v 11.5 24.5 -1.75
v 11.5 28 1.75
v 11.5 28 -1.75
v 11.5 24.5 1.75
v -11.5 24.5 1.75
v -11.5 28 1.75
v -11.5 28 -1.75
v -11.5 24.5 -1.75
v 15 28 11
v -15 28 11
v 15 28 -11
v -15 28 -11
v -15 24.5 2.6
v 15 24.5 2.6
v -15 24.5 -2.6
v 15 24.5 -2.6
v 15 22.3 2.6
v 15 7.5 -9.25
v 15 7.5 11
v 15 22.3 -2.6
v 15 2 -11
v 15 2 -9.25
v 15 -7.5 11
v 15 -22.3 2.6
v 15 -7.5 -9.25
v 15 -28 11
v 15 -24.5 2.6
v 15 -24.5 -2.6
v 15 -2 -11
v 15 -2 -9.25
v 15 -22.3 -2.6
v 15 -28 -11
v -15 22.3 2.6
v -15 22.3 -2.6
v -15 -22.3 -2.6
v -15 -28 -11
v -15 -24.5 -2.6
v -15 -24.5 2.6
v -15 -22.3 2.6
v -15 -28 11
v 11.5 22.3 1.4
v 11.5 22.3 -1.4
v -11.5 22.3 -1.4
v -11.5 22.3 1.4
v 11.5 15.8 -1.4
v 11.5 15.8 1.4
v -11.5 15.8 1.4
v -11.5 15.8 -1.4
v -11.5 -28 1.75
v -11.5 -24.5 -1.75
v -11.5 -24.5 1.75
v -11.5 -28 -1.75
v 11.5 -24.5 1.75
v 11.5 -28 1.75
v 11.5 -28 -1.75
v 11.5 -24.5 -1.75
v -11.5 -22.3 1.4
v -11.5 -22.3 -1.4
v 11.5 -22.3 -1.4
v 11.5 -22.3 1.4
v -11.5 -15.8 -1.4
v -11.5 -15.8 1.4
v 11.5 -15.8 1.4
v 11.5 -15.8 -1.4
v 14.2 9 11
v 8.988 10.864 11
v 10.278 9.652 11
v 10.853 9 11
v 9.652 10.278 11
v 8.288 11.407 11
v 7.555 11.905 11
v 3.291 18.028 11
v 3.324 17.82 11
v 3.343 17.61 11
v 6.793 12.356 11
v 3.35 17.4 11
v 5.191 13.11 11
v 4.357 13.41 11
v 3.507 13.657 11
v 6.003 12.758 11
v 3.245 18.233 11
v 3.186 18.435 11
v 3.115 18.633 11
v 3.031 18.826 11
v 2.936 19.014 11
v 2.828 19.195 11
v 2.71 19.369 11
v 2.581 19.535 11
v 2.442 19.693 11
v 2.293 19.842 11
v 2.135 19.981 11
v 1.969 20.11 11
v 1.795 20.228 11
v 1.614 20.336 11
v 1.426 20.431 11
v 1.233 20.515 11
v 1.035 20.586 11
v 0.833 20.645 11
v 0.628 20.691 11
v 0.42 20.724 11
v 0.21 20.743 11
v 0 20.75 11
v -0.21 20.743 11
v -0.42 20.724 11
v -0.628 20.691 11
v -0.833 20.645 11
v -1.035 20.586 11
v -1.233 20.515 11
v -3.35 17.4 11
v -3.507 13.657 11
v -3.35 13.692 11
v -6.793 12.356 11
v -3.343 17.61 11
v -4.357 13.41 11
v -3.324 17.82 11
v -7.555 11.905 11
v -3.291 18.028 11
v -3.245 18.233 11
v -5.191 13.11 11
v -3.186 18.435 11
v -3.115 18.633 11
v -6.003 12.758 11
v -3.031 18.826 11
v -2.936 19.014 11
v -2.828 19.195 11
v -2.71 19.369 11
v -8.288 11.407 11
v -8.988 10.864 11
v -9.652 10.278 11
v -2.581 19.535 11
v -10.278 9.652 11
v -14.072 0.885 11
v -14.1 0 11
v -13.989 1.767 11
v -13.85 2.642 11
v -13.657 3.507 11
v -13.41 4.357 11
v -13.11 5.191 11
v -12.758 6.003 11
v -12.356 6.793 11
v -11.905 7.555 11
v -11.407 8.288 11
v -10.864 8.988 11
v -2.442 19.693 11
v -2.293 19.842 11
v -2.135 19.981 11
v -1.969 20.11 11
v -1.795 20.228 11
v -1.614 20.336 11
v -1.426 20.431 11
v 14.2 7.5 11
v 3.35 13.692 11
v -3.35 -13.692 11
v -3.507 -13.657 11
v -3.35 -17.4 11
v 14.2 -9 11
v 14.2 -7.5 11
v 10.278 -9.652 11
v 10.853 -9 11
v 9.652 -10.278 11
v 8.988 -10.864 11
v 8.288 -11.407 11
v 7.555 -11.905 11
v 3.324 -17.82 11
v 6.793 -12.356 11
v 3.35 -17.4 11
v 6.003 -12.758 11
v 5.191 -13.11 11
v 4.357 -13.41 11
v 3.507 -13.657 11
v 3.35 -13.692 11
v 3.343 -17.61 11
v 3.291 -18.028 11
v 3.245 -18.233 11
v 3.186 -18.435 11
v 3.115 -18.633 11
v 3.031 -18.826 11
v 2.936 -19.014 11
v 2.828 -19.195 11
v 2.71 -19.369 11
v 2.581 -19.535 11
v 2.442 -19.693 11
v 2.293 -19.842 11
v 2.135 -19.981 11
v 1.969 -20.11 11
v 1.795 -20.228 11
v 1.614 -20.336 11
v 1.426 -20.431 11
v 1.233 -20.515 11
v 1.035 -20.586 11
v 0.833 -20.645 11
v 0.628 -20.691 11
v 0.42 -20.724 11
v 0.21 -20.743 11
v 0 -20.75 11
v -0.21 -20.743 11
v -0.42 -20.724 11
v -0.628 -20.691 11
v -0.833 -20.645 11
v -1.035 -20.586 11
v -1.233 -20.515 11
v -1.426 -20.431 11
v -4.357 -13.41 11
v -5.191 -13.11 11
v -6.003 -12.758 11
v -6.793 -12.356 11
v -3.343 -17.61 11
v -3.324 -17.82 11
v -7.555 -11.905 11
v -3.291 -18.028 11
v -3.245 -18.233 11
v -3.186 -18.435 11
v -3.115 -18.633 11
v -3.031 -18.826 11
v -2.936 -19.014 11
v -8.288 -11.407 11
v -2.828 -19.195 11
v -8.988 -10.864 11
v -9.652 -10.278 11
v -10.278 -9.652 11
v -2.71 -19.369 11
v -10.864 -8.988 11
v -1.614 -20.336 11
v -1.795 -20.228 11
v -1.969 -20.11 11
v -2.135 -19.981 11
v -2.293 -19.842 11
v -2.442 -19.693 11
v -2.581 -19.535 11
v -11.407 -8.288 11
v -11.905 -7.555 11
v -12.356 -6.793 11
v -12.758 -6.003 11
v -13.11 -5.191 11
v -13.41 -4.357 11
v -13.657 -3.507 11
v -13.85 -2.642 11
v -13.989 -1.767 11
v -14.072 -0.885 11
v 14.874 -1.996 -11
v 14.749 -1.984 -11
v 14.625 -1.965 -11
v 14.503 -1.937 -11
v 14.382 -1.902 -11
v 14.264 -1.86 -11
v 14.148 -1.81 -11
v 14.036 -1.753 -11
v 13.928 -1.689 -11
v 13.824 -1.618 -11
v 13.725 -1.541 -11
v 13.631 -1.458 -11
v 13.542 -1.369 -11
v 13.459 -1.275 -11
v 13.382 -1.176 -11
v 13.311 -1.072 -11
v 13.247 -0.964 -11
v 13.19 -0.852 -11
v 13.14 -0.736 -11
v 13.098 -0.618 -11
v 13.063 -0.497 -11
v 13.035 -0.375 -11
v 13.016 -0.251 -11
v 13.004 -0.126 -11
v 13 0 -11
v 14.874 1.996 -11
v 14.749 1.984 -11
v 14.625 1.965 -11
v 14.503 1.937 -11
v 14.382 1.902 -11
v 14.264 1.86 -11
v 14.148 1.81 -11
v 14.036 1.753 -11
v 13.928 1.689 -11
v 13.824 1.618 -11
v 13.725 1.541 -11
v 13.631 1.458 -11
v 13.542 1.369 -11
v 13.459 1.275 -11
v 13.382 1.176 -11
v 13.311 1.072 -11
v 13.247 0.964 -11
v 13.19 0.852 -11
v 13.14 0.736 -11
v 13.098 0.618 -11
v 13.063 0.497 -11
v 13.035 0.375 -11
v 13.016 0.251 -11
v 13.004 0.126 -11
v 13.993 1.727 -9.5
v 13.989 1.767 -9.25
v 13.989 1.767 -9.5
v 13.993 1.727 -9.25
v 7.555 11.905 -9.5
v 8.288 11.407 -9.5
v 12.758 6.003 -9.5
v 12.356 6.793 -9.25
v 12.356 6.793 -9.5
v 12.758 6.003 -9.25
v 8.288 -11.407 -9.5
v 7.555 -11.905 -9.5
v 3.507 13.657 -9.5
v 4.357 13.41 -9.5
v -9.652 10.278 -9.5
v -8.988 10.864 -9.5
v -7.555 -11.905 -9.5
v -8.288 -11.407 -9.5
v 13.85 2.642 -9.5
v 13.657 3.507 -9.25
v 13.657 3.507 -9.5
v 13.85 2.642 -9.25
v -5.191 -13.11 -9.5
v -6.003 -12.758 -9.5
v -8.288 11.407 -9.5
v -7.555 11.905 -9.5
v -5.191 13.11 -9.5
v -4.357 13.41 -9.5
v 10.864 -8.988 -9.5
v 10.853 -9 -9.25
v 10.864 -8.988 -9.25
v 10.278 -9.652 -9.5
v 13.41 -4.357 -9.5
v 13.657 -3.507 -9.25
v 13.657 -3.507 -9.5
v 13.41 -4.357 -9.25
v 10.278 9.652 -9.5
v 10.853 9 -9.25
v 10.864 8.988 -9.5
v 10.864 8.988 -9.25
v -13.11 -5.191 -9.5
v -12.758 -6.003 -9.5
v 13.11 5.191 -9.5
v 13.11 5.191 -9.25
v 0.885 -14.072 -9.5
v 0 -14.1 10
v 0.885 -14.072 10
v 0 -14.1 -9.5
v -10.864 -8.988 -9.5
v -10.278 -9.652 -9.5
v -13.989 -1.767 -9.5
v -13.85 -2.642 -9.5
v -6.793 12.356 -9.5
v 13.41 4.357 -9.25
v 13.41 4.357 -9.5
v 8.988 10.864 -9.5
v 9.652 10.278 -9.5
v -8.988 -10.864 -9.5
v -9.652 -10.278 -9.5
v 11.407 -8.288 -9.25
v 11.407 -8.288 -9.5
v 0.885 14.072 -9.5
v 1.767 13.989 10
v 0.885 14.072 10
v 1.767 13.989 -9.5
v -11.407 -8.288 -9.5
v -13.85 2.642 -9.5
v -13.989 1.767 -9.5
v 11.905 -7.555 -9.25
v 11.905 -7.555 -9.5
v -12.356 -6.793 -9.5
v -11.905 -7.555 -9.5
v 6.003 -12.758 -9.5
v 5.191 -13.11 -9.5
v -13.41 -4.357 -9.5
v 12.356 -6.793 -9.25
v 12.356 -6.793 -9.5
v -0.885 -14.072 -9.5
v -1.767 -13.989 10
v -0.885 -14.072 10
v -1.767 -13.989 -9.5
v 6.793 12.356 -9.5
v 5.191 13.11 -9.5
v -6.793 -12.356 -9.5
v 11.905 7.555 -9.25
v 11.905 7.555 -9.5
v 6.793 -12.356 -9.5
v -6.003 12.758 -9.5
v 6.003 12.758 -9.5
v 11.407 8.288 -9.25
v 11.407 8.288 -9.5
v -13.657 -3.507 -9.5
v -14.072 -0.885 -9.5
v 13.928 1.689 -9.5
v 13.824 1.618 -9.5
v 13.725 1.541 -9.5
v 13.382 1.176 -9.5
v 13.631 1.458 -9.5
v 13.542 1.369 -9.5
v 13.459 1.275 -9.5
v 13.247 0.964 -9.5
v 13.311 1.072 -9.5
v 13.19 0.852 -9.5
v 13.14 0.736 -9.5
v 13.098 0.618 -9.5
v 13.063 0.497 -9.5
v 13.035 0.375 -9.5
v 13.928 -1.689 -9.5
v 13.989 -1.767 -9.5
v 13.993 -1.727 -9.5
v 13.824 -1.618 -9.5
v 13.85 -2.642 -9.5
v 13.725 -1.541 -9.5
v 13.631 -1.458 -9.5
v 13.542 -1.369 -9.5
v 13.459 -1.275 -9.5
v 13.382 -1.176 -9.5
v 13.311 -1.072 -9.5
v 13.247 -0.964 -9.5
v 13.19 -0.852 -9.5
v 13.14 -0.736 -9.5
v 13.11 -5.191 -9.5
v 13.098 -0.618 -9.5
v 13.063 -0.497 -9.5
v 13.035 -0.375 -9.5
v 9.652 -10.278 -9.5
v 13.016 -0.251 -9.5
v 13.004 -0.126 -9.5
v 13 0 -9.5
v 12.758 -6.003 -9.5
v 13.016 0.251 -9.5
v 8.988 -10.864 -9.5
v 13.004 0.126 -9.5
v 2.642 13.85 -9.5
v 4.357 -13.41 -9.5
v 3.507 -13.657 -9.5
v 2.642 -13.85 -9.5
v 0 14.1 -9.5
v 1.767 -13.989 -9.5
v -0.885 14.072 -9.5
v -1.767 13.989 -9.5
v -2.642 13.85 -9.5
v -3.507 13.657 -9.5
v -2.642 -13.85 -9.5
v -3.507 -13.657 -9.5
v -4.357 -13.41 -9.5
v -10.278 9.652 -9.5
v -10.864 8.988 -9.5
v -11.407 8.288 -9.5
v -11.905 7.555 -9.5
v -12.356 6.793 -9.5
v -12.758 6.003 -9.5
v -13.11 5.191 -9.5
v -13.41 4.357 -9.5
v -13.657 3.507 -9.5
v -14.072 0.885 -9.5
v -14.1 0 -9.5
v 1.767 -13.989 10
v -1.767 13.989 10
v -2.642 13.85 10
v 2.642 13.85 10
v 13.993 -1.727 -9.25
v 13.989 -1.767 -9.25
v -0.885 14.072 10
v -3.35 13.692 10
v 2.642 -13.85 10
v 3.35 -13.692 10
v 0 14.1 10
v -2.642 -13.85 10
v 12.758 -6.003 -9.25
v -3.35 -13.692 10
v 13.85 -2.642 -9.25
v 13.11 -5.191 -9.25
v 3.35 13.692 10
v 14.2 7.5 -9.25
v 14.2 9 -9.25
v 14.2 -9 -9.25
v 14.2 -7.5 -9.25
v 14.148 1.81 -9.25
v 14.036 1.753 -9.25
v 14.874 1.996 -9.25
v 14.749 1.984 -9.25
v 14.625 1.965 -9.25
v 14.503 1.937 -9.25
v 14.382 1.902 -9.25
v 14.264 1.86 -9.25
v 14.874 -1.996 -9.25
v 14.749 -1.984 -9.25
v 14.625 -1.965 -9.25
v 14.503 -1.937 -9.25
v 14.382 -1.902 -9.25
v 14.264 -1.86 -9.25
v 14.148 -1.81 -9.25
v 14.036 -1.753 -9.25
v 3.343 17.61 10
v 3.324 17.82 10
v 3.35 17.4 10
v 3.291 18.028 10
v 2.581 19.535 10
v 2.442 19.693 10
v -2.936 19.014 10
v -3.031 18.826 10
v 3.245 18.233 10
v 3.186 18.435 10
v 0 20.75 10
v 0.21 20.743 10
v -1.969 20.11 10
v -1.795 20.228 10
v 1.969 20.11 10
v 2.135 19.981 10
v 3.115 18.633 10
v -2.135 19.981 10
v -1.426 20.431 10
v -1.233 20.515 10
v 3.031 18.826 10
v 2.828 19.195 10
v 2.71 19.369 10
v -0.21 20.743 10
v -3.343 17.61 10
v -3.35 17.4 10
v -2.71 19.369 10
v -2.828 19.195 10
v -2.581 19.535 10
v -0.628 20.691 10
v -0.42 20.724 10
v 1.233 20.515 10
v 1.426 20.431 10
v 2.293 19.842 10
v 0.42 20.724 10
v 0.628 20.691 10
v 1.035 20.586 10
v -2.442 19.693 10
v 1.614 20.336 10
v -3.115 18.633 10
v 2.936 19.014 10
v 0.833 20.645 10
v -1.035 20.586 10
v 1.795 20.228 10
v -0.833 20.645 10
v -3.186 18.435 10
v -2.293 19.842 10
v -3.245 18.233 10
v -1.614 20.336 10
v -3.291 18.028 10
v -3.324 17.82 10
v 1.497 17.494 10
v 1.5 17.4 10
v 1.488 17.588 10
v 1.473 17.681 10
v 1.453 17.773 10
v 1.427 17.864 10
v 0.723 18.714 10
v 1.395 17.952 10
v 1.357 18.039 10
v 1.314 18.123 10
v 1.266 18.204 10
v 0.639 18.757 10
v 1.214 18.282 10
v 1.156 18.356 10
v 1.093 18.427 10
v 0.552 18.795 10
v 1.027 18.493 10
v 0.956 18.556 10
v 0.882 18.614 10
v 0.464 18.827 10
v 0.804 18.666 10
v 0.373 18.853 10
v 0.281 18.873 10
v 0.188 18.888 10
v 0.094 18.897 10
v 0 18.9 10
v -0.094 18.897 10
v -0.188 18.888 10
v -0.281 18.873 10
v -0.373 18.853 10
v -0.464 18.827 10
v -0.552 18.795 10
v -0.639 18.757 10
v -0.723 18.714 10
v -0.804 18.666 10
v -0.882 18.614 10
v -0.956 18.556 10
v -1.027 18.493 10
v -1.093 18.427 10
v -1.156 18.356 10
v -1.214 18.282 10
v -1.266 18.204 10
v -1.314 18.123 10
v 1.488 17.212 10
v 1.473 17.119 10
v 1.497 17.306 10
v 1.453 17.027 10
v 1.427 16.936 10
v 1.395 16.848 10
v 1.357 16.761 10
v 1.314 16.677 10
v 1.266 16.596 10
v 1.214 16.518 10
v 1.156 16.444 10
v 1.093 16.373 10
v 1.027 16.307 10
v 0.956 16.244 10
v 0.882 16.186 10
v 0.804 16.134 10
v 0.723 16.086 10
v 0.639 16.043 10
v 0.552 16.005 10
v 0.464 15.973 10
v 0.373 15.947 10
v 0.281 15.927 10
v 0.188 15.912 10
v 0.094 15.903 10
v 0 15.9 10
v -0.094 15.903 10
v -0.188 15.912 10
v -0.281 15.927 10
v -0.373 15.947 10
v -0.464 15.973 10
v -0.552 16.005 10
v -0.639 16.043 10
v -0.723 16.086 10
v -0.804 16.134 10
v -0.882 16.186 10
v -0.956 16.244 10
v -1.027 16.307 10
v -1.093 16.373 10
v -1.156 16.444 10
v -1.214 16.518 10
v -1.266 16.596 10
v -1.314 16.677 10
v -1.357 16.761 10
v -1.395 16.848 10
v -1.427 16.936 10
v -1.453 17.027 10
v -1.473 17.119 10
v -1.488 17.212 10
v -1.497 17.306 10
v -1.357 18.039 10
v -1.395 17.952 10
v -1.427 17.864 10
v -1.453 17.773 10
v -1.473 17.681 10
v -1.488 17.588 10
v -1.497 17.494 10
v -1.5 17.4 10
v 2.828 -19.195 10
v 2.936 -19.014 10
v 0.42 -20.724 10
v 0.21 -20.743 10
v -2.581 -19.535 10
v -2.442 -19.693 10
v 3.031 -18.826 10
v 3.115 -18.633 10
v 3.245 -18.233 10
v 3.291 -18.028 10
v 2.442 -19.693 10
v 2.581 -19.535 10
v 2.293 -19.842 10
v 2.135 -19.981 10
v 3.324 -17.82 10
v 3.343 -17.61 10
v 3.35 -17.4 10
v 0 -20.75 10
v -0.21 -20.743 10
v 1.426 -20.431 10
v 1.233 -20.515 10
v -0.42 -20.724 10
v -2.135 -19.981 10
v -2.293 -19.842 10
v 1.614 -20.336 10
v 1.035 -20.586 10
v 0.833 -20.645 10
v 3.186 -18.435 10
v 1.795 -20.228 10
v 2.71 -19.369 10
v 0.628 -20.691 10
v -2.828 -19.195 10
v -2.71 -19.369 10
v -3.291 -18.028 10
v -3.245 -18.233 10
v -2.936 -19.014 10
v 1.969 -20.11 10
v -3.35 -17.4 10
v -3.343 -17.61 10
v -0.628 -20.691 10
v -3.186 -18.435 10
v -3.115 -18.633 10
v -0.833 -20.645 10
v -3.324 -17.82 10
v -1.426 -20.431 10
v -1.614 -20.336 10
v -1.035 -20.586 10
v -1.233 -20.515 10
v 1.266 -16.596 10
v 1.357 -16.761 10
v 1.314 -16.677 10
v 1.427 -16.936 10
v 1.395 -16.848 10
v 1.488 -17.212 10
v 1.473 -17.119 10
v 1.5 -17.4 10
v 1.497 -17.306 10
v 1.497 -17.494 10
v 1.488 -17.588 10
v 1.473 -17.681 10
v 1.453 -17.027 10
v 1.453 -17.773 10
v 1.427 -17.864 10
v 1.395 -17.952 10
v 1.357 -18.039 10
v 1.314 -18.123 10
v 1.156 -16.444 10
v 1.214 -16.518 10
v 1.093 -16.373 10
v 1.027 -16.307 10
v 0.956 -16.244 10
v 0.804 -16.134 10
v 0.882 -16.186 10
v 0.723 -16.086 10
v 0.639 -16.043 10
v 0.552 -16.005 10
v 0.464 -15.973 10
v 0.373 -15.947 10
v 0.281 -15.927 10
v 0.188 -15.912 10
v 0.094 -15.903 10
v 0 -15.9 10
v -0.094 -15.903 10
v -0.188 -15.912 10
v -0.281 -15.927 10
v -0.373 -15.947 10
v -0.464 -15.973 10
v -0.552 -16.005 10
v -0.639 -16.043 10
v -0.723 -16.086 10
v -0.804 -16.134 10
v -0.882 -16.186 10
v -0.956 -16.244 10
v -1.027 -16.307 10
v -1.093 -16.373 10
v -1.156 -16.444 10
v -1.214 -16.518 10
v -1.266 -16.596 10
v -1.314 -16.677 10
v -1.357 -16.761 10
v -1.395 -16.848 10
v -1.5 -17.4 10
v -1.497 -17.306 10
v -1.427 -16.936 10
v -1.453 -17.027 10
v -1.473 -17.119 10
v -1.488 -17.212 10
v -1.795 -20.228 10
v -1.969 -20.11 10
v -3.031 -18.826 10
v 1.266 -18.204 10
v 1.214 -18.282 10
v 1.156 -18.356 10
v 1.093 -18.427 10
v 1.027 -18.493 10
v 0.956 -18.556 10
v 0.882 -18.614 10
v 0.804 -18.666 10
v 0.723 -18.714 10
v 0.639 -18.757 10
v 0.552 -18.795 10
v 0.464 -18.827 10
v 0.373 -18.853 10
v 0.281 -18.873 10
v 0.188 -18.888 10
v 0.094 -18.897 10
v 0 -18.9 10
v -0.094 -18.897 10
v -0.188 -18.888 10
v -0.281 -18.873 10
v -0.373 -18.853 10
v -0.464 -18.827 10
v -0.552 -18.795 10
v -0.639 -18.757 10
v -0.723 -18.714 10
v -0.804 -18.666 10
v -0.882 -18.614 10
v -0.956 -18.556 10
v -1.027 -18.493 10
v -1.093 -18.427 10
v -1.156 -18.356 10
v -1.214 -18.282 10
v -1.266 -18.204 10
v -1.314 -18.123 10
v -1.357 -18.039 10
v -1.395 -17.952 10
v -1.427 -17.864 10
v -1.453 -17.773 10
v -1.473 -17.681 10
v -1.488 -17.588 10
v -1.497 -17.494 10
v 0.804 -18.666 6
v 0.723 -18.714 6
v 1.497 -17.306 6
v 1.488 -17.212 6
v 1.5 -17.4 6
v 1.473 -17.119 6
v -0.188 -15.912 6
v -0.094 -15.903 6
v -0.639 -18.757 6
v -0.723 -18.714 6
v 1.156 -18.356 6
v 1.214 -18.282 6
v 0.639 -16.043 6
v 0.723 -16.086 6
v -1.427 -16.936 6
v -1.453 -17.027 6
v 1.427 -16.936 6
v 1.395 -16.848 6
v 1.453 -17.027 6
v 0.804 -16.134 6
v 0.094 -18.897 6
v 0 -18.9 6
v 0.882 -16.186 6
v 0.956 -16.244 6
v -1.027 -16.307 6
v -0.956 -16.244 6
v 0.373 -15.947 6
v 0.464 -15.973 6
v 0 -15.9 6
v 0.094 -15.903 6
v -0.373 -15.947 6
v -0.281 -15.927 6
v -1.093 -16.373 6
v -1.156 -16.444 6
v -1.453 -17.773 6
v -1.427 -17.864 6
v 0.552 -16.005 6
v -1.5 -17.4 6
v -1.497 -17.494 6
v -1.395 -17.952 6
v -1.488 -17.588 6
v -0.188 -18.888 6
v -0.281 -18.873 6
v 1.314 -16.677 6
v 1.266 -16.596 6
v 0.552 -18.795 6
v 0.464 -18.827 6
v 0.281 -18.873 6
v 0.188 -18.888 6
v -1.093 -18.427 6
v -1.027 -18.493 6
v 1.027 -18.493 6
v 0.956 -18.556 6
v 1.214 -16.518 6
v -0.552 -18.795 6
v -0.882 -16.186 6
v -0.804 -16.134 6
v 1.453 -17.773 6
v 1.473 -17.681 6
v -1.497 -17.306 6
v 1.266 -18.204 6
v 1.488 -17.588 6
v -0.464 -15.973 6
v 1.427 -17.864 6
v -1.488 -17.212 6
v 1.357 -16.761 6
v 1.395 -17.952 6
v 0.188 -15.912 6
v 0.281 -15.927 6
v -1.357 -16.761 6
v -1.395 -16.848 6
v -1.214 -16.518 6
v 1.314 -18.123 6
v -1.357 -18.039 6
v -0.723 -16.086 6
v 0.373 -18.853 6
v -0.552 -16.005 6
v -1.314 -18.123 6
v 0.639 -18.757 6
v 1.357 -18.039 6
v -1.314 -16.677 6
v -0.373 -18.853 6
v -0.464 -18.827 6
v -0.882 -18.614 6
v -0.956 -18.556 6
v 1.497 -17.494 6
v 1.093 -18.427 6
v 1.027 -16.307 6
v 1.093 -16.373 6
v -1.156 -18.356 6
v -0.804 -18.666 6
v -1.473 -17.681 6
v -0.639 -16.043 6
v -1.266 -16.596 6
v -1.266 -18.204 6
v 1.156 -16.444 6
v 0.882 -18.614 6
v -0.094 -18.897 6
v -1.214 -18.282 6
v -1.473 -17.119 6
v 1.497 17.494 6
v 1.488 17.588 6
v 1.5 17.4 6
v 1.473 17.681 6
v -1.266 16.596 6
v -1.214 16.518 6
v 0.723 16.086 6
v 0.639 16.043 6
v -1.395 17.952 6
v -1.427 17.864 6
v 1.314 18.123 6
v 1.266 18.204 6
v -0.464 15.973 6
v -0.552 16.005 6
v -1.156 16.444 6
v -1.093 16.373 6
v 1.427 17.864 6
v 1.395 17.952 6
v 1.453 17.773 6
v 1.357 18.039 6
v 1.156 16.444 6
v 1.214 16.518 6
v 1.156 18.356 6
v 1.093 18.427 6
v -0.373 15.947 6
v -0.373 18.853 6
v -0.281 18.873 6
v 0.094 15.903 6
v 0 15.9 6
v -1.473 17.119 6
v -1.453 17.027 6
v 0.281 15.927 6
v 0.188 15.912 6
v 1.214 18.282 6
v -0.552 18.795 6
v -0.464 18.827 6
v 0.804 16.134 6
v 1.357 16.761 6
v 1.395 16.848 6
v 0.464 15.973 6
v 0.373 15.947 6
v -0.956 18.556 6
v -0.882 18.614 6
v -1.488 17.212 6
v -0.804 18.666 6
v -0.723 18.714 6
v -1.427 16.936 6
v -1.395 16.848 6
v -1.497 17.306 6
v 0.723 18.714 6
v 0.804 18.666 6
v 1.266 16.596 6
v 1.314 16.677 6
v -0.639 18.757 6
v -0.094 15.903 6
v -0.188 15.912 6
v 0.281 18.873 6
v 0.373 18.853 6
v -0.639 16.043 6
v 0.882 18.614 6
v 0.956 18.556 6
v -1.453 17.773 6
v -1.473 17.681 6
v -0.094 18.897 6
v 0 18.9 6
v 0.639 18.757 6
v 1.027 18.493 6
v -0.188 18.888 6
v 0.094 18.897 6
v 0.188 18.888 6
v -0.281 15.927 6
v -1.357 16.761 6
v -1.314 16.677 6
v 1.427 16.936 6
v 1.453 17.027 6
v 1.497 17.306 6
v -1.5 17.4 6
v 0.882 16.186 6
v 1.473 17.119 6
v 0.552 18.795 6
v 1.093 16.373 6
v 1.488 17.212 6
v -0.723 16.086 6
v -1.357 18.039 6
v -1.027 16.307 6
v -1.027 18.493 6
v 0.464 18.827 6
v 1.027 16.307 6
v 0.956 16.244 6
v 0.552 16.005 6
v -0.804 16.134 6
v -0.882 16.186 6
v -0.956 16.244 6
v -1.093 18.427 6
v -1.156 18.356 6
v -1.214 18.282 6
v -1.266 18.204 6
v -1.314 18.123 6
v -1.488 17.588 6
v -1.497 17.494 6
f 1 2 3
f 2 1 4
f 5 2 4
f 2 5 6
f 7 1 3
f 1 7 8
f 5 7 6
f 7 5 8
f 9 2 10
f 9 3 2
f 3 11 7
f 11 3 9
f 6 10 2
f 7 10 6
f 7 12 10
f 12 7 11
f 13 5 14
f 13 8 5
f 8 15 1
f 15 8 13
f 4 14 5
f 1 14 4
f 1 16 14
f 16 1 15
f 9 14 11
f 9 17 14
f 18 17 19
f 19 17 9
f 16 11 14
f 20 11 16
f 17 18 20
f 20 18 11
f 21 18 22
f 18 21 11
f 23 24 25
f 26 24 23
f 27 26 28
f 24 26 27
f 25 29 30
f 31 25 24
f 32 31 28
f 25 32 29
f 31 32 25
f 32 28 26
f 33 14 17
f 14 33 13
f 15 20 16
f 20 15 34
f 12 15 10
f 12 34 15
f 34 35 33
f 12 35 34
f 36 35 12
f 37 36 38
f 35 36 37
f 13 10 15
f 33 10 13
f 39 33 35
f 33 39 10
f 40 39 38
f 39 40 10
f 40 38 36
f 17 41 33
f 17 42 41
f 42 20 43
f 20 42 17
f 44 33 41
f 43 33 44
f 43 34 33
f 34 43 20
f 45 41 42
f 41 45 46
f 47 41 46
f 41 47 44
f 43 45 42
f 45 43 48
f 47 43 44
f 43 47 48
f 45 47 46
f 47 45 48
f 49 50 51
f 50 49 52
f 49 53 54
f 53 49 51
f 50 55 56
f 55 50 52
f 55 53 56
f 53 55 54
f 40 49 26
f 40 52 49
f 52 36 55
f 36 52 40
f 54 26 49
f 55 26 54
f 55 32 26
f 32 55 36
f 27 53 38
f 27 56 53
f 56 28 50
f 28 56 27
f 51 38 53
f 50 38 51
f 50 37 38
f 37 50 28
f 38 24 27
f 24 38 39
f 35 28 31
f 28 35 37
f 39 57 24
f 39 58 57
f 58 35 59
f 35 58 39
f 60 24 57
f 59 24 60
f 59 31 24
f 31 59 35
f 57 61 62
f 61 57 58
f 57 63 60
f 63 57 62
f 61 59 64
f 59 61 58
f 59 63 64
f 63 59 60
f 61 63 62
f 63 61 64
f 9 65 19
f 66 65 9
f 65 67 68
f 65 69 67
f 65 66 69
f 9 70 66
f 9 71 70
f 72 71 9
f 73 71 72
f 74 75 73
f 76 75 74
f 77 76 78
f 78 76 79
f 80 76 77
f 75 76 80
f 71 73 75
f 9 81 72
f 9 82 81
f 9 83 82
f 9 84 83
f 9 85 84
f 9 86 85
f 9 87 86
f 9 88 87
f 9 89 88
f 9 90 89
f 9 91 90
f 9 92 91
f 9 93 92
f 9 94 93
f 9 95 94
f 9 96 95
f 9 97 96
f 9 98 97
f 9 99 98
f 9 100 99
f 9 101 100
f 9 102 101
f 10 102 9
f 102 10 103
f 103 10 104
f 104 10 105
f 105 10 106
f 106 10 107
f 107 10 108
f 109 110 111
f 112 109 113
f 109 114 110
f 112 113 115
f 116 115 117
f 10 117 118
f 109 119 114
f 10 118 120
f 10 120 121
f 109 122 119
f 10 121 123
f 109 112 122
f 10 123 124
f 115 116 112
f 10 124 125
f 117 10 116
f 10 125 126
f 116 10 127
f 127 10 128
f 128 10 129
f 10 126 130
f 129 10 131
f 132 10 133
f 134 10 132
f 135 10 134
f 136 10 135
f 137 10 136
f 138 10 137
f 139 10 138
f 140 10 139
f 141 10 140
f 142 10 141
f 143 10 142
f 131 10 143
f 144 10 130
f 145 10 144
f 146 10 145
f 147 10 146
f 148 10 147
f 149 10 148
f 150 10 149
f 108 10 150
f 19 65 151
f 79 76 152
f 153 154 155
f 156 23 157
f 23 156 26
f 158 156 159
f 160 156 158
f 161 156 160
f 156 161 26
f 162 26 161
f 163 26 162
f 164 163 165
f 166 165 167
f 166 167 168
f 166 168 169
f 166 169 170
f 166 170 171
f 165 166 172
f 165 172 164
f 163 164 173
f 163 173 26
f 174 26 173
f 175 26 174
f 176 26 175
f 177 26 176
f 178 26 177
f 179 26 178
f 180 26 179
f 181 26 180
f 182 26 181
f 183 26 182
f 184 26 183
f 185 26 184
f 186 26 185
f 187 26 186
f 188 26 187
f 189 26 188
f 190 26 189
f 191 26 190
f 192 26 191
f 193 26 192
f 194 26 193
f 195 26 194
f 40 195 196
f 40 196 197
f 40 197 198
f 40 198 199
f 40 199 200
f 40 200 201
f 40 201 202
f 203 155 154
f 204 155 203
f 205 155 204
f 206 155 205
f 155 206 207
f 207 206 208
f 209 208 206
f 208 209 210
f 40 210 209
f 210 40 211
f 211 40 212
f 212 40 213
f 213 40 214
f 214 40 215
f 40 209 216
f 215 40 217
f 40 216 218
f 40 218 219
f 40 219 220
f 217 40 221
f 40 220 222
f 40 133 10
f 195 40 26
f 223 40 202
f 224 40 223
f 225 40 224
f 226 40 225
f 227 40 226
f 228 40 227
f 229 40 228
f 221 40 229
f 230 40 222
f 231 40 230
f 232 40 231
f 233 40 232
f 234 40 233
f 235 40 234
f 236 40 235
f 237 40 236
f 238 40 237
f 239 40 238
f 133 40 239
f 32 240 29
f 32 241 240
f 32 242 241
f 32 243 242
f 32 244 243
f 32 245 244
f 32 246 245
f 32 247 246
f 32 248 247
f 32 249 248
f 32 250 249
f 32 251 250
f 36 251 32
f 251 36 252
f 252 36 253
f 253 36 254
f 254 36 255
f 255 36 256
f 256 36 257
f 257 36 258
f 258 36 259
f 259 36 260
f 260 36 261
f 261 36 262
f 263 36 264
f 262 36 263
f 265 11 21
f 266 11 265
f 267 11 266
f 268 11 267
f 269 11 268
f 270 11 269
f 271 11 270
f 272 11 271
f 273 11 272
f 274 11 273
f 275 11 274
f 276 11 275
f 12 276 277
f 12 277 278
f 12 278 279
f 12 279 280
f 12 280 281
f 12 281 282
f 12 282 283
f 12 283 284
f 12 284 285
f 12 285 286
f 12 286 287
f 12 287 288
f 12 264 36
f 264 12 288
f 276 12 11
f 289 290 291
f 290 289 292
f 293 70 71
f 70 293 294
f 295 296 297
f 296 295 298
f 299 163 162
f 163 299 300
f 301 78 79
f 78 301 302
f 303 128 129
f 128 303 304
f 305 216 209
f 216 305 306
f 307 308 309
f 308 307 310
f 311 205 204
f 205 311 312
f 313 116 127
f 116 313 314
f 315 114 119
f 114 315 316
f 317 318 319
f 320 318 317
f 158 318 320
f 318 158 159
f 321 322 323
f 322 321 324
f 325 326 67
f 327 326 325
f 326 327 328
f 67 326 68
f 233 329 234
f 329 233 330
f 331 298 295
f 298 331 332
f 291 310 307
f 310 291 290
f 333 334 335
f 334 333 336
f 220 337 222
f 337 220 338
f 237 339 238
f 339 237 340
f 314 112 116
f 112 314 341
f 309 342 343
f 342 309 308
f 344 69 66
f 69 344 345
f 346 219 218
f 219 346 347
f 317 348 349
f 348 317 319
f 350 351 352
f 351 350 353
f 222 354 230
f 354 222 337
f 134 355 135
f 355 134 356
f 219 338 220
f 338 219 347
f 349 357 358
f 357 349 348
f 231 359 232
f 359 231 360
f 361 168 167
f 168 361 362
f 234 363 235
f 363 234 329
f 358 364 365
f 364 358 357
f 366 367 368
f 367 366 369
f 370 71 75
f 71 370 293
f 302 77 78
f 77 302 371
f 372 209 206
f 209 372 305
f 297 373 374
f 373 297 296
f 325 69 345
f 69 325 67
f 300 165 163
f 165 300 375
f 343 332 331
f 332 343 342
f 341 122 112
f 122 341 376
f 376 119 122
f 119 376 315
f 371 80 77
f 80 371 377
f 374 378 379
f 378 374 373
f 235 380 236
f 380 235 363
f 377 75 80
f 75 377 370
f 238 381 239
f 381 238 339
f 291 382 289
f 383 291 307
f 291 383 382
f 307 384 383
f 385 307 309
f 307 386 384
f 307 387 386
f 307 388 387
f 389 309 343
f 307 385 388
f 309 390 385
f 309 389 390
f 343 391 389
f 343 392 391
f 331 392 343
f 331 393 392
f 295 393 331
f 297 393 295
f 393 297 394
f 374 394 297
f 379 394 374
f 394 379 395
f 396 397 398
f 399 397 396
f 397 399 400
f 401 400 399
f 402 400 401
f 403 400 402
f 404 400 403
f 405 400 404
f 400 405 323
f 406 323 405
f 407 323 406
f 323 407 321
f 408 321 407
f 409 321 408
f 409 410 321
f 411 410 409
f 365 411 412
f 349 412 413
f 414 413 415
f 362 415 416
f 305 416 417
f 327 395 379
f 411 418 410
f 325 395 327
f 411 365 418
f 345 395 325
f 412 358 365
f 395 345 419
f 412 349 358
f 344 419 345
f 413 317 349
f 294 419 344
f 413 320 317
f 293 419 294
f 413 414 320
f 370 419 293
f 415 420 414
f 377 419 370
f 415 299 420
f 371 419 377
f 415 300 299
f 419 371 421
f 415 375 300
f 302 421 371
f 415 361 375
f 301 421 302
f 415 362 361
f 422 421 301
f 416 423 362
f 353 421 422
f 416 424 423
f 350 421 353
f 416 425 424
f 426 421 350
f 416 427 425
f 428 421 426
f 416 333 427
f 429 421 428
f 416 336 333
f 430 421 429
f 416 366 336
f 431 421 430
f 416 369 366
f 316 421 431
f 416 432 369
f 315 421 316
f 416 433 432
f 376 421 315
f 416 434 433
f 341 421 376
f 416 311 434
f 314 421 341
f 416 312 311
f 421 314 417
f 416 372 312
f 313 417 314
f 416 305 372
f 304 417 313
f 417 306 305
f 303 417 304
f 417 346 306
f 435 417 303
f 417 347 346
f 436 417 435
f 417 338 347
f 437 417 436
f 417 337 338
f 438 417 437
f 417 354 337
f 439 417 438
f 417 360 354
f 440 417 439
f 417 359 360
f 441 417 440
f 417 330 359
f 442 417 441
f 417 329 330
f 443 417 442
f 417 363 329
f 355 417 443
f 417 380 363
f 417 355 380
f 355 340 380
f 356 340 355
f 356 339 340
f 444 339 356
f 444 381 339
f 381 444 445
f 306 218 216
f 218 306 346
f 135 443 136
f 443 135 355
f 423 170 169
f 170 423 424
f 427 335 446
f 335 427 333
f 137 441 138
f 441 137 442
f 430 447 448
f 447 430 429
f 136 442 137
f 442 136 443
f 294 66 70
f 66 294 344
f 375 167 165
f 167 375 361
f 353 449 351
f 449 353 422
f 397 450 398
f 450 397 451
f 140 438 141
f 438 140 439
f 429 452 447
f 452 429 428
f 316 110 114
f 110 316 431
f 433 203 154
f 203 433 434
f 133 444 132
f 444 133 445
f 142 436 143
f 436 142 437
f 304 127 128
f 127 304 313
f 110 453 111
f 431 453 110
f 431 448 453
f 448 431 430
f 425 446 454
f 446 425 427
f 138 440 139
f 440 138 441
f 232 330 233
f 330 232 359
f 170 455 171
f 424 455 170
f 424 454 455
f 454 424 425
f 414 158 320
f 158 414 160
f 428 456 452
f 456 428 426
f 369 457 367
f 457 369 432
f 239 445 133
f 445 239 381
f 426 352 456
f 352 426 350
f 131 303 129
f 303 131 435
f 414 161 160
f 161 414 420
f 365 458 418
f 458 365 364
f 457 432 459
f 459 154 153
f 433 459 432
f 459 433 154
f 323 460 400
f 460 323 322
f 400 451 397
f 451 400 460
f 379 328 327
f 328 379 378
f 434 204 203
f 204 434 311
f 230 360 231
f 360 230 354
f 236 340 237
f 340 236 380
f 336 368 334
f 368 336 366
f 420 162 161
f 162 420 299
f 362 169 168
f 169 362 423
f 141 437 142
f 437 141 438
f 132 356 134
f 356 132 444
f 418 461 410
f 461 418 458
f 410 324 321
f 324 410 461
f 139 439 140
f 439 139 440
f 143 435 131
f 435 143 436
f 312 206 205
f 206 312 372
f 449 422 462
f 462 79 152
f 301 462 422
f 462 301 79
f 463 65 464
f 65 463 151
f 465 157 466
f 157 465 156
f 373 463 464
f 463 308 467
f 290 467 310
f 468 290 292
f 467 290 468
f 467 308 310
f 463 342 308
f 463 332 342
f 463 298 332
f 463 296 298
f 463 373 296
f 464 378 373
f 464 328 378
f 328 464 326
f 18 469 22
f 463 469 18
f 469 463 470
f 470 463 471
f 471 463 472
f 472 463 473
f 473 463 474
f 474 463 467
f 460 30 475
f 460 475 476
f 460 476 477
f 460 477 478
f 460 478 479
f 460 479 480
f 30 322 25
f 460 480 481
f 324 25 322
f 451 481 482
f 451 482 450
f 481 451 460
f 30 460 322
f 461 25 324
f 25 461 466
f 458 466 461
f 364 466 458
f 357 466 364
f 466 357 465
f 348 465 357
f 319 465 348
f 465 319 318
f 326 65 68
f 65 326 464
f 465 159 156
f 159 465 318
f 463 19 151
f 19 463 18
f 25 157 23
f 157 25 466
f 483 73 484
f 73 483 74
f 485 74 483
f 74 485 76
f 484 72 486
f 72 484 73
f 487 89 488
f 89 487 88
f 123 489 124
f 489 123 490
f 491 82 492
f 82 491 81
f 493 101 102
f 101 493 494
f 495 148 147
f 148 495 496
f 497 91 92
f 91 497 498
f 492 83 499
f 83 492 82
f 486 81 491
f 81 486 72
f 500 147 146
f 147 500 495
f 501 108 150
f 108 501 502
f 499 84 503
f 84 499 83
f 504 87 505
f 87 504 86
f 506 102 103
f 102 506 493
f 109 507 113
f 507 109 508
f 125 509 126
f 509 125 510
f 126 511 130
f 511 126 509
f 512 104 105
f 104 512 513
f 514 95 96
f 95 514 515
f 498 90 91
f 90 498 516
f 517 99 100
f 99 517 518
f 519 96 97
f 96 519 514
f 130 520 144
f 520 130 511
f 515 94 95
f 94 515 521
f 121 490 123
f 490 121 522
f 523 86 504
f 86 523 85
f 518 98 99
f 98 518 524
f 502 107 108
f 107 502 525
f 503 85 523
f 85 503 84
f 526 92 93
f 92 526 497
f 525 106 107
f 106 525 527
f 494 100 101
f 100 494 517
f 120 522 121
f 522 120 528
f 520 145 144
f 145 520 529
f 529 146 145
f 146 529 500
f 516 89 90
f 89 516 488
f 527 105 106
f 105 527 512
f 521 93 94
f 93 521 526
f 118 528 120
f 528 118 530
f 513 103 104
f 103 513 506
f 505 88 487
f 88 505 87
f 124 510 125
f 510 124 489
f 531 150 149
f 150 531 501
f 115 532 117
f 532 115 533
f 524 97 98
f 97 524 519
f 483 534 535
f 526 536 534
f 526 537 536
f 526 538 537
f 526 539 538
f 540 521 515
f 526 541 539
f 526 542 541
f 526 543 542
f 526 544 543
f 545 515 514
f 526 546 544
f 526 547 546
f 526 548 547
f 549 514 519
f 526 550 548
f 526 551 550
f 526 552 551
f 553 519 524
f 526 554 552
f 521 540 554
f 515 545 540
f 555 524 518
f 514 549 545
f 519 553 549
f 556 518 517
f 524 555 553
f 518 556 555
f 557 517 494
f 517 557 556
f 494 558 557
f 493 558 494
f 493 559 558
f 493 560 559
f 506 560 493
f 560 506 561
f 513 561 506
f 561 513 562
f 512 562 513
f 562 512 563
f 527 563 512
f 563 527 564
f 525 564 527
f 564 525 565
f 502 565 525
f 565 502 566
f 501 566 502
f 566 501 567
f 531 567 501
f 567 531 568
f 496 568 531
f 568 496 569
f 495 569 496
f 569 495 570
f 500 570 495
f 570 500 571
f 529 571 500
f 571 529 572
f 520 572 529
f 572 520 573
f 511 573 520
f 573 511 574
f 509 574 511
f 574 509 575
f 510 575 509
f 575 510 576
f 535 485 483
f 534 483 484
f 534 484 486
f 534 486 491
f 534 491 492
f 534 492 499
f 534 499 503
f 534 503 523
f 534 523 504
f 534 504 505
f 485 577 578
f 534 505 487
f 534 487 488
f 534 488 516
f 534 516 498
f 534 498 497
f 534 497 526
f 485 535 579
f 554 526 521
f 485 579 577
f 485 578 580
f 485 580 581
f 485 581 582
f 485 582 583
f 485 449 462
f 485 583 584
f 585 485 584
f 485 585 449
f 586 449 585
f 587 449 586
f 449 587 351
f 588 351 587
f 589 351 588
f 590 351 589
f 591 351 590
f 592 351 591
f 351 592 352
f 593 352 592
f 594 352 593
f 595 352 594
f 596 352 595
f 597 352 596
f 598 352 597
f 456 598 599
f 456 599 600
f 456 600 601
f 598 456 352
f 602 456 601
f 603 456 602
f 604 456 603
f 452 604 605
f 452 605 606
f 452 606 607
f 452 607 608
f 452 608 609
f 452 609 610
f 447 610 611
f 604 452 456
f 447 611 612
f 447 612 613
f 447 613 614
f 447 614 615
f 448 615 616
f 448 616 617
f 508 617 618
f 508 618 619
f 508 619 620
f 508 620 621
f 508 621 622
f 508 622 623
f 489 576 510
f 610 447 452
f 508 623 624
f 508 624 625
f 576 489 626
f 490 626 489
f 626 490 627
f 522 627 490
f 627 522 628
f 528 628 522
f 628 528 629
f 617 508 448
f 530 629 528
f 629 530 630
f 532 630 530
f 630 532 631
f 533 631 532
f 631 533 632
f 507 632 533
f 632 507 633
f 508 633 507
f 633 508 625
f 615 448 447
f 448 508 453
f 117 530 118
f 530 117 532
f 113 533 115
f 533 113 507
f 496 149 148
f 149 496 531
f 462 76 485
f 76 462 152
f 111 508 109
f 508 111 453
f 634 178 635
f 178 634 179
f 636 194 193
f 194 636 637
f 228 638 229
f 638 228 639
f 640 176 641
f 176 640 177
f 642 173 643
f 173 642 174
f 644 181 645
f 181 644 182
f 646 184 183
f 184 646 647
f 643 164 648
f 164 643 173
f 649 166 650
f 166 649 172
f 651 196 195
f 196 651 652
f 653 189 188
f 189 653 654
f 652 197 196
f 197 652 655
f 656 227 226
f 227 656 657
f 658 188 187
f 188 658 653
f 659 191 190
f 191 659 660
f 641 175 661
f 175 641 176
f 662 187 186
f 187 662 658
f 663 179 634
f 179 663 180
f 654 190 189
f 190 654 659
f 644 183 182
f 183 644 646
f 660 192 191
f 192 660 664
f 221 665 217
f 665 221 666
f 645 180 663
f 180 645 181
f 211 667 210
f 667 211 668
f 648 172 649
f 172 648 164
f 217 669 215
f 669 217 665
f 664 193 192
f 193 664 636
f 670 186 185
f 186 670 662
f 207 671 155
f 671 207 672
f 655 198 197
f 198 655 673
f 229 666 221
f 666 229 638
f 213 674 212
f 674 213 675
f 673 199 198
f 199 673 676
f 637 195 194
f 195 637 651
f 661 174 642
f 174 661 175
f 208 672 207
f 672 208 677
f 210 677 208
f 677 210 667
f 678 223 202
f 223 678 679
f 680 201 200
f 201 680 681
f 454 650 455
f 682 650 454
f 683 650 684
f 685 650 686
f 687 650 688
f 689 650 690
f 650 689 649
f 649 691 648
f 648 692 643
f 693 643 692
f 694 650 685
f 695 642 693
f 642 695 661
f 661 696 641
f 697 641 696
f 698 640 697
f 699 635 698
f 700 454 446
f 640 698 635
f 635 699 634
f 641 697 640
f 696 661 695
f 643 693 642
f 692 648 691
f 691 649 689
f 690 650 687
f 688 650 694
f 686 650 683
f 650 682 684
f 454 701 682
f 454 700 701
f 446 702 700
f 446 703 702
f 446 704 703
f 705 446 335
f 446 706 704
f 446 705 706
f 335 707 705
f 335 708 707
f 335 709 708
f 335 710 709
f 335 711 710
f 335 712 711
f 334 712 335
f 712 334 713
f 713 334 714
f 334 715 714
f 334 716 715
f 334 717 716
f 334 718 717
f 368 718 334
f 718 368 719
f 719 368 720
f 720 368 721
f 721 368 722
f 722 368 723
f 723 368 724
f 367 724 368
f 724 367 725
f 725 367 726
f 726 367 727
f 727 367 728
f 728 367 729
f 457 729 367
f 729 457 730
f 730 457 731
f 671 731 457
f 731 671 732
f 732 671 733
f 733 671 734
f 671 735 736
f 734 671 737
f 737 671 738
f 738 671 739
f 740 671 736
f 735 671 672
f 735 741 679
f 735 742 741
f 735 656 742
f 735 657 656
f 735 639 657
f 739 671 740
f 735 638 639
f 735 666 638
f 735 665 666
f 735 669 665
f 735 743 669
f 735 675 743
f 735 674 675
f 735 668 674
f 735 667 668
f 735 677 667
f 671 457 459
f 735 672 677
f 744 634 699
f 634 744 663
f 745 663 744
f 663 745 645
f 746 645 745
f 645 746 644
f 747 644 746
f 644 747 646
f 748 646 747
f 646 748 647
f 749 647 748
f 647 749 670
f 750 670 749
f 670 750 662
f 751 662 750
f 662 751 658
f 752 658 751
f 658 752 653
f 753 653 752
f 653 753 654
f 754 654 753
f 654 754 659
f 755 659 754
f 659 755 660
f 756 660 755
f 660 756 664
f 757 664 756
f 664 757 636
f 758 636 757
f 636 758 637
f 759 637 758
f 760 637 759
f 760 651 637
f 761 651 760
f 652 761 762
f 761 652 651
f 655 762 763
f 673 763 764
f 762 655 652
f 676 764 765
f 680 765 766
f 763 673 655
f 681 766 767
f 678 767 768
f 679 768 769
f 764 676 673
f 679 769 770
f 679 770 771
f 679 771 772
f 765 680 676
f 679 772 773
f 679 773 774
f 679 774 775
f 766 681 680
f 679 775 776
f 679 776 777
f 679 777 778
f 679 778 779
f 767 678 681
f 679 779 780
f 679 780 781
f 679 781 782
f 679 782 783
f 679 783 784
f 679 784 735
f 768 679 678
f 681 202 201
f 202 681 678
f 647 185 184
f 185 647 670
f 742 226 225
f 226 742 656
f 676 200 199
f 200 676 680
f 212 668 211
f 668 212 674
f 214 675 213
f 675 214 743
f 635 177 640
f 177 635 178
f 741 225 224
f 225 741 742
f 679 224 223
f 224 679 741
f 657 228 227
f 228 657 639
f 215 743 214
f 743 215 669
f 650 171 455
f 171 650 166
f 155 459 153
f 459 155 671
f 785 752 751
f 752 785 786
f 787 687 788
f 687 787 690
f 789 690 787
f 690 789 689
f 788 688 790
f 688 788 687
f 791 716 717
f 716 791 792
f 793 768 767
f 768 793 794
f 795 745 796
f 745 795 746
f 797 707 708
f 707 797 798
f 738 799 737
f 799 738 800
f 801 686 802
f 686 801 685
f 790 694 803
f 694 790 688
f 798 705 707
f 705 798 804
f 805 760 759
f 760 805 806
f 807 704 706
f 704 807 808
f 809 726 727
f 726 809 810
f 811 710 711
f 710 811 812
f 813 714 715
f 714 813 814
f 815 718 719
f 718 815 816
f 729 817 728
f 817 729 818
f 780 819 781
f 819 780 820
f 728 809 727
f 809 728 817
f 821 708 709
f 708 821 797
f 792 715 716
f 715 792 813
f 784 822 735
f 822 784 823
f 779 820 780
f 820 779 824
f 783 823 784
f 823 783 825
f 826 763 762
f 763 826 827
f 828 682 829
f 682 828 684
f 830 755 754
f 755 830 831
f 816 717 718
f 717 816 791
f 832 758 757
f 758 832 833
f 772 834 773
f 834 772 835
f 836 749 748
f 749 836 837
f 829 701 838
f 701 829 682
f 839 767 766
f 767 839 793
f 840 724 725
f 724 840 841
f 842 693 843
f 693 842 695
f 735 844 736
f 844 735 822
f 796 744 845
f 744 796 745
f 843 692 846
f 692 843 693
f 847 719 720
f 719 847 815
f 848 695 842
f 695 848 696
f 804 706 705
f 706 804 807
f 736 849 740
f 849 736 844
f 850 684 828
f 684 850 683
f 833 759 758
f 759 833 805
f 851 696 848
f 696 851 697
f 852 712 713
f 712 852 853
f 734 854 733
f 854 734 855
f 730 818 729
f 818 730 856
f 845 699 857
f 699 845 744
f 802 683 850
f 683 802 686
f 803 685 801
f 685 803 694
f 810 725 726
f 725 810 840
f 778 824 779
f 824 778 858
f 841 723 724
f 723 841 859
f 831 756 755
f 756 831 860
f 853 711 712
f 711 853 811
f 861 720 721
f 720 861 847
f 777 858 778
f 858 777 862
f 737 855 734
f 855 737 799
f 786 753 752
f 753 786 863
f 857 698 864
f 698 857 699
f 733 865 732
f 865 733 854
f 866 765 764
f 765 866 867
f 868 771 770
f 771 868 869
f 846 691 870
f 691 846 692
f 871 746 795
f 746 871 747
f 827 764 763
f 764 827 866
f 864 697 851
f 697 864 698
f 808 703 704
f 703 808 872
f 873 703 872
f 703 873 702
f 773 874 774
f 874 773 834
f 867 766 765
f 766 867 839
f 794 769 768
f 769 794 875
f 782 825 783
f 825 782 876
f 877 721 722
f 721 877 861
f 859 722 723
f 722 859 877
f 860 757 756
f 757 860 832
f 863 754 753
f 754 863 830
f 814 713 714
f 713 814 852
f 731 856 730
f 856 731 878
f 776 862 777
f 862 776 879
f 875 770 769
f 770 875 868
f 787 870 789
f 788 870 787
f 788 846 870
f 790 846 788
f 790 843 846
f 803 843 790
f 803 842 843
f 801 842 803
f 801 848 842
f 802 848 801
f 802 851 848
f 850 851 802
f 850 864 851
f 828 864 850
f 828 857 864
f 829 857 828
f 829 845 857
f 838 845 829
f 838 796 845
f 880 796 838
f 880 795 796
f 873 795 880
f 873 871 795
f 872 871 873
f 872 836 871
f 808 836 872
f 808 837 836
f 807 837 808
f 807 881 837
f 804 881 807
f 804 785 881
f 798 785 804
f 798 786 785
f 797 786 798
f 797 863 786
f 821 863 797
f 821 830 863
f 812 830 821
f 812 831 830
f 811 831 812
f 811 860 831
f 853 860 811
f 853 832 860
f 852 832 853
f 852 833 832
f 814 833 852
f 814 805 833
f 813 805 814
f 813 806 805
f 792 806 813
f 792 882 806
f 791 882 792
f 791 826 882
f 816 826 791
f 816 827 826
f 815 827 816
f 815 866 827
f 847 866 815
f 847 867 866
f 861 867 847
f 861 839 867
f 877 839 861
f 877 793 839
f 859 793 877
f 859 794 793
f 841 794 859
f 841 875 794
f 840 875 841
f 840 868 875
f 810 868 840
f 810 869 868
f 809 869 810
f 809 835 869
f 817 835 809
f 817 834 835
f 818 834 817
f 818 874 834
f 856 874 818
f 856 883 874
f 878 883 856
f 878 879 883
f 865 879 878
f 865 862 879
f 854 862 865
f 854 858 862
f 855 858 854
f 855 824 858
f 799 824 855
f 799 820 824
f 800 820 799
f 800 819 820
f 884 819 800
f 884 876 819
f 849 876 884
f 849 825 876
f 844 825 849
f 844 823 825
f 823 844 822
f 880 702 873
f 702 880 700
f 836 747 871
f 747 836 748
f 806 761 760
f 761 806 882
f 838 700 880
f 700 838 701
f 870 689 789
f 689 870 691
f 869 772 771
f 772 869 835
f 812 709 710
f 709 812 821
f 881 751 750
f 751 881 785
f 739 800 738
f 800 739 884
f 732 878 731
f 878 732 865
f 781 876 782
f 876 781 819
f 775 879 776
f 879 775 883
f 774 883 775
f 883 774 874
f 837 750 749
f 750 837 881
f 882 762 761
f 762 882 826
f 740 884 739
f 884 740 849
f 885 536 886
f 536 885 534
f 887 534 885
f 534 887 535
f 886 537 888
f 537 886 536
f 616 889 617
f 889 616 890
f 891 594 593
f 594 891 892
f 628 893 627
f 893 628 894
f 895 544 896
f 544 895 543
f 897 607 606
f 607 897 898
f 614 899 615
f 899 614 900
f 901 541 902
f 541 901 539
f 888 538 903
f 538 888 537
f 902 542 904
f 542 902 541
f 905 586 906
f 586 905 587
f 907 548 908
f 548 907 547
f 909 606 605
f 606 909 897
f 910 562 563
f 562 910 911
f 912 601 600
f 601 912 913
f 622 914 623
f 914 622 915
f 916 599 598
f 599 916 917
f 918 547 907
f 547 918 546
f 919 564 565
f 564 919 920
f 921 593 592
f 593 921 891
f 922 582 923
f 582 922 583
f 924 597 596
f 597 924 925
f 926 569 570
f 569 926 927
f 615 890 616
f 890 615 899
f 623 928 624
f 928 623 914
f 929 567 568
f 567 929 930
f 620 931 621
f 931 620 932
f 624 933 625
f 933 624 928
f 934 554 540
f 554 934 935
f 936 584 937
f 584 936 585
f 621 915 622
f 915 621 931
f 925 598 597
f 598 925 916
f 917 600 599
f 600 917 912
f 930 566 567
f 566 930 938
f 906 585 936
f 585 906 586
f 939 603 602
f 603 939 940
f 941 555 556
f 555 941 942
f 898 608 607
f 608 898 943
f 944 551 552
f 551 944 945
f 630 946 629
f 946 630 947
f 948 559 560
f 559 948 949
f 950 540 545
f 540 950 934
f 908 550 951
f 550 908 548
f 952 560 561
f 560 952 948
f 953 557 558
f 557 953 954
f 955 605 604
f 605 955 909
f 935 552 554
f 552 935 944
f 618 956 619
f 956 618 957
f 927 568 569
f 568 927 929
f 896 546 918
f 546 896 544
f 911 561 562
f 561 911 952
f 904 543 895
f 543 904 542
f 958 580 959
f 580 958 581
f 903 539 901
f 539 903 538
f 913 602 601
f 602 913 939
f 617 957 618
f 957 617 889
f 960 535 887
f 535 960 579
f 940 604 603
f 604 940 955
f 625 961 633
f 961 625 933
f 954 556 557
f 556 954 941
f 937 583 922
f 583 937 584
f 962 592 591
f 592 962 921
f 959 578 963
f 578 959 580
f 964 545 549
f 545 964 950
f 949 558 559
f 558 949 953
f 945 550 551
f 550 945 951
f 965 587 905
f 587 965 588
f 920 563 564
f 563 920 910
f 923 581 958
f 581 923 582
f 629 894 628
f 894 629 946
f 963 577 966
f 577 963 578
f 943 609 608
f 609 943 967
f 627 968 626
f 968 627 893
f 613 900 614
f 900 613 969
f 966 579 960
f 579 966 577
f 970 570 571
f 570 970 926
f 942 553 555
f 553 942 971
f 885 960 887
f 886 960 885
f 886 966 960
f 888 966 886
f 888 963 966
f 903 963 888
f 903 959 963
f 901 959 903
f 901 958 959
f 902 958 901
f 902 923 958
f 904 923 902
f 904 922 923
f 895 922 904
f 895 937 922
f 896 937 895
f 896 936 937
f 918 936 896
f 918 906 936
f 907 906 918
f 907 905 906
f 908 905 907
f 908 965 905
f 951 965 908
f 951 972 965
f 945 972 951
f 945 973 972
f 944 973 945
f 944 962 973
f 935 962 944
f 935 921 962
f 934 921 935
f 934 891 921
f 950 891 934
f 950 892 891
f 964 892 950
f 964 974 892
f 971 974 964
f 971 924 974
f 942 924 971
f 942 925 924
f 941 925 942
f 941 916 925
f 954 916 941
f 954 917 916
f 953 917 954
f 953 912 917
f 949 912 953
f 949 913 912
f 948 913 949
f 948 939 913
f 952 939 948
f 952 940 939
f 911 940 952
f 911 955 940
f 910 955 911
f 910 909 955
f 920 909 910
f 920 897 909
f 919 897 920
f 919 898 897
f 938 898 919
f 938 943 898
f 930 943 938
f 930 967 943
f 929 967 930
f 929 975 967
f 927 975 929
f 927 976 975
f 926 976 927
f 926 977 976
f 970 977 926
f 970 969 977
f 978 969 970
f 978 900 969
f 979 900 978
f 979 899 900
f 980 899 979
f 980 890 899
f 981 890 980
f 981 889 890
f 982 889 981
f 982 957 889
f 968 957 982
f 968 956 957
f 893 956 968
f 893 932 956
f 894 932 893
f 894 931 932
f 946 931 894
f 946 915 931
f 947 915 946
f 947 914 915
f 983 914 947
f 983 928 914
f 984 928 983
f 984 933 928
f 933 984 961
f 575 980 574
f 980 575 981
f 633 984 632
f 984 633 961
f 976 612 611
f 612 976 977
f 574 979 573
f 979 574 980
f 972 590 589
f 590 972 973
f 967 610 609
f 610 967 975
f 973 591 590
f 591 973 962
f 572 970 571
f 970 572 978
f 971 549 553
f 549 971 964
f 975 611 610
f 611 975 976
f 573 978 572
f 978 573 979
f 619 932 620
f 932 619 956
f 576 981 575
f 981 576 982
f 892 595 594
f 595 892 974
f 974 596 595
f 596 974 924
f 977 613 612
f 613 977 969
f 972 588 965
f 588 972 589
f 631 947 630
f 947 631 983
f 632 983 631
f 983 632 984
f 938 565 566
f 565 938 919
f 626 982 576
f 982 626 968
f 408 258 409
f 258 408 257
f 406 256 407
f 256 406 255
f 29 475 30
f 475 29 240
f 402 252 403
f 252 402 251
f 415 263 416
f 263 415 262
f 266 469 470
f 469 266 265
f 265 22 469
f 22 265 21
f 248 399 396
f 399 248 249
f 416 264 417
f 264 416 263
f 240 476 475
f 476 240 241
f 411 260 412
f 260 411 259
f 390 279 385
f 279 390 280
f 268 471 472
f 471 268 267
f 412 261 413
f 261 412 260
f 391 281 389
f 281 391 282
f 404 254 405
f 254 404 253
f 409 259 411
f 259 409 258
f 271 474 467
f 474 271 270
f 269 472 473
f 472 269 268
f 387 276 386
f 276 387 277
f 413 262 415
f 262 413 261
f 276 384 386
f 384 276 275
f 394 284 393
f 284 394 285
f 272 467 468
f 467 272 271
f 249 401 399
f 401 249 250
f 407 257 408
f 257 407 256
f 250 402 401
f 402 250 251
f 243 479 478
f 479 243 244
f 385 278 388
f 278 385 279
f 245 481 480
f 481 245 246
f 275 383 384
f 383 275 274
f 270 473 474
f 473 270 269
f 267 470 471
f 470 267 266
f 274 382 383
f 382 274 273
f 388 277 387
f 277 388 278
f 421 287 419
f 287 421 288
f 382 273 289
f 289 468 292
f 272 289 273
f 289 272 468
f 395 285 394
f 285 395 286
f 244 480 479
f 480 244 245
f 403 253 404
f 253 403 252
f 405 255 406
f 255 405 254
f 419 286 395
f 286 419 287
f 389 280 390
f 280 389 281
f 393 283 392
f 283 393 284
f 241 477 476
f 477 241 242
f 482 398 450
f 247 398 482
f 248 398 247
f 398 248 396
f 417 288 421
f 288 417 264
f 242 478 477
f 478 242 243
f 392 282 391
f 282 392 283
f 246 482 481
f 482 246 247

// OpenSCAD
// this is based on thehookup's Motorized MQTT Blinds project:
// https://github.com/thehookup/Motorized_MQTT_Blinds/blob/master/BlindsBase.scad

block_z = 22;
block_y = 56;
block_x = 30;
cylinder_cutout_depth = 25;

$fn = 100;

module screw_gap() {
  wall_thickness = 3.5;
  wall_hole_diameter = 3.5;
  wall_hole_margin = 3.5;

  nut_thickness = 2.2;
  nut_hole_diameter = 5.2;

  screw_hole_thickness = 6.5;
  screw_hole_diameter = 2.8;

  // sum all thickness = 12.2

  translate([0, -wall_thickness/2, 0]) union() {
    cube([
      block_x - wall_hole_margin * 2,
      wall_thickness,
      wall_hole_diameter,
    ], center=true);

    translate([0, -wall_thickness/2 - nut_thickness/2, 0])
      cube([block_x, nut_thickness, nut_hole_diameter], center=true);

    translate([0, -wall_thickness/2 - nut_thickness - screw_hole_thickness/2, 0])
      cube([
        block_x - wall_hole_margin * 2,
        screw_hole_thickness,
        screw_hole_diameter,
      ], center=true);
  }
}

module motor_case() {
  difference() {
    cube([block_x, block_y, block_z], center=true);
    
    color("blue")
      translate([0,0,3])
      cylinder(r=14.1, h=cylinder_cutout_depth, $fn=100, center=true);
    color("red") translate([5.7,0,6]) cube([17,18,30.5], center=true);
    color("black") translate([10,0,6]) cube([17,15,30.5], center=true);

    color("purple") translate([0,17.4,10]) cylinder(r=3.35, h=2, $fn=100);
    color("orange") translate([0,14.05,11]) cube([6.7,6.7,2], center=true);

    color("purple") translate([0,-17.4,10]) cylinder(r=3.35, h=2, $fn=100);
    color("orange") translate([0,-14.05,11]) cube([6.7,6.7,2], center=true);

    color("green") translate([0,-17.4,6]) cylinder(r=1.5, h=5, $fn=100);
    color("green") translate([0,17.4,6]) cylinder(r=1.5, h=5, $fn=100);

    color("cyan")
      translate([(block_x / 2),0,-(block_z/2)])
      cylinder(r=2, h=4, $fn=100, center=true);

    /* holes for screws */
    translate([0, block_y / 2, 0])
      screw_gap();

    /* holes for screws */
    translate([0, -block_y / 2, 0])
      rotate([0, 0, 180])
      screw_gap();
  }

}

motor_case();
//screw_gap();
